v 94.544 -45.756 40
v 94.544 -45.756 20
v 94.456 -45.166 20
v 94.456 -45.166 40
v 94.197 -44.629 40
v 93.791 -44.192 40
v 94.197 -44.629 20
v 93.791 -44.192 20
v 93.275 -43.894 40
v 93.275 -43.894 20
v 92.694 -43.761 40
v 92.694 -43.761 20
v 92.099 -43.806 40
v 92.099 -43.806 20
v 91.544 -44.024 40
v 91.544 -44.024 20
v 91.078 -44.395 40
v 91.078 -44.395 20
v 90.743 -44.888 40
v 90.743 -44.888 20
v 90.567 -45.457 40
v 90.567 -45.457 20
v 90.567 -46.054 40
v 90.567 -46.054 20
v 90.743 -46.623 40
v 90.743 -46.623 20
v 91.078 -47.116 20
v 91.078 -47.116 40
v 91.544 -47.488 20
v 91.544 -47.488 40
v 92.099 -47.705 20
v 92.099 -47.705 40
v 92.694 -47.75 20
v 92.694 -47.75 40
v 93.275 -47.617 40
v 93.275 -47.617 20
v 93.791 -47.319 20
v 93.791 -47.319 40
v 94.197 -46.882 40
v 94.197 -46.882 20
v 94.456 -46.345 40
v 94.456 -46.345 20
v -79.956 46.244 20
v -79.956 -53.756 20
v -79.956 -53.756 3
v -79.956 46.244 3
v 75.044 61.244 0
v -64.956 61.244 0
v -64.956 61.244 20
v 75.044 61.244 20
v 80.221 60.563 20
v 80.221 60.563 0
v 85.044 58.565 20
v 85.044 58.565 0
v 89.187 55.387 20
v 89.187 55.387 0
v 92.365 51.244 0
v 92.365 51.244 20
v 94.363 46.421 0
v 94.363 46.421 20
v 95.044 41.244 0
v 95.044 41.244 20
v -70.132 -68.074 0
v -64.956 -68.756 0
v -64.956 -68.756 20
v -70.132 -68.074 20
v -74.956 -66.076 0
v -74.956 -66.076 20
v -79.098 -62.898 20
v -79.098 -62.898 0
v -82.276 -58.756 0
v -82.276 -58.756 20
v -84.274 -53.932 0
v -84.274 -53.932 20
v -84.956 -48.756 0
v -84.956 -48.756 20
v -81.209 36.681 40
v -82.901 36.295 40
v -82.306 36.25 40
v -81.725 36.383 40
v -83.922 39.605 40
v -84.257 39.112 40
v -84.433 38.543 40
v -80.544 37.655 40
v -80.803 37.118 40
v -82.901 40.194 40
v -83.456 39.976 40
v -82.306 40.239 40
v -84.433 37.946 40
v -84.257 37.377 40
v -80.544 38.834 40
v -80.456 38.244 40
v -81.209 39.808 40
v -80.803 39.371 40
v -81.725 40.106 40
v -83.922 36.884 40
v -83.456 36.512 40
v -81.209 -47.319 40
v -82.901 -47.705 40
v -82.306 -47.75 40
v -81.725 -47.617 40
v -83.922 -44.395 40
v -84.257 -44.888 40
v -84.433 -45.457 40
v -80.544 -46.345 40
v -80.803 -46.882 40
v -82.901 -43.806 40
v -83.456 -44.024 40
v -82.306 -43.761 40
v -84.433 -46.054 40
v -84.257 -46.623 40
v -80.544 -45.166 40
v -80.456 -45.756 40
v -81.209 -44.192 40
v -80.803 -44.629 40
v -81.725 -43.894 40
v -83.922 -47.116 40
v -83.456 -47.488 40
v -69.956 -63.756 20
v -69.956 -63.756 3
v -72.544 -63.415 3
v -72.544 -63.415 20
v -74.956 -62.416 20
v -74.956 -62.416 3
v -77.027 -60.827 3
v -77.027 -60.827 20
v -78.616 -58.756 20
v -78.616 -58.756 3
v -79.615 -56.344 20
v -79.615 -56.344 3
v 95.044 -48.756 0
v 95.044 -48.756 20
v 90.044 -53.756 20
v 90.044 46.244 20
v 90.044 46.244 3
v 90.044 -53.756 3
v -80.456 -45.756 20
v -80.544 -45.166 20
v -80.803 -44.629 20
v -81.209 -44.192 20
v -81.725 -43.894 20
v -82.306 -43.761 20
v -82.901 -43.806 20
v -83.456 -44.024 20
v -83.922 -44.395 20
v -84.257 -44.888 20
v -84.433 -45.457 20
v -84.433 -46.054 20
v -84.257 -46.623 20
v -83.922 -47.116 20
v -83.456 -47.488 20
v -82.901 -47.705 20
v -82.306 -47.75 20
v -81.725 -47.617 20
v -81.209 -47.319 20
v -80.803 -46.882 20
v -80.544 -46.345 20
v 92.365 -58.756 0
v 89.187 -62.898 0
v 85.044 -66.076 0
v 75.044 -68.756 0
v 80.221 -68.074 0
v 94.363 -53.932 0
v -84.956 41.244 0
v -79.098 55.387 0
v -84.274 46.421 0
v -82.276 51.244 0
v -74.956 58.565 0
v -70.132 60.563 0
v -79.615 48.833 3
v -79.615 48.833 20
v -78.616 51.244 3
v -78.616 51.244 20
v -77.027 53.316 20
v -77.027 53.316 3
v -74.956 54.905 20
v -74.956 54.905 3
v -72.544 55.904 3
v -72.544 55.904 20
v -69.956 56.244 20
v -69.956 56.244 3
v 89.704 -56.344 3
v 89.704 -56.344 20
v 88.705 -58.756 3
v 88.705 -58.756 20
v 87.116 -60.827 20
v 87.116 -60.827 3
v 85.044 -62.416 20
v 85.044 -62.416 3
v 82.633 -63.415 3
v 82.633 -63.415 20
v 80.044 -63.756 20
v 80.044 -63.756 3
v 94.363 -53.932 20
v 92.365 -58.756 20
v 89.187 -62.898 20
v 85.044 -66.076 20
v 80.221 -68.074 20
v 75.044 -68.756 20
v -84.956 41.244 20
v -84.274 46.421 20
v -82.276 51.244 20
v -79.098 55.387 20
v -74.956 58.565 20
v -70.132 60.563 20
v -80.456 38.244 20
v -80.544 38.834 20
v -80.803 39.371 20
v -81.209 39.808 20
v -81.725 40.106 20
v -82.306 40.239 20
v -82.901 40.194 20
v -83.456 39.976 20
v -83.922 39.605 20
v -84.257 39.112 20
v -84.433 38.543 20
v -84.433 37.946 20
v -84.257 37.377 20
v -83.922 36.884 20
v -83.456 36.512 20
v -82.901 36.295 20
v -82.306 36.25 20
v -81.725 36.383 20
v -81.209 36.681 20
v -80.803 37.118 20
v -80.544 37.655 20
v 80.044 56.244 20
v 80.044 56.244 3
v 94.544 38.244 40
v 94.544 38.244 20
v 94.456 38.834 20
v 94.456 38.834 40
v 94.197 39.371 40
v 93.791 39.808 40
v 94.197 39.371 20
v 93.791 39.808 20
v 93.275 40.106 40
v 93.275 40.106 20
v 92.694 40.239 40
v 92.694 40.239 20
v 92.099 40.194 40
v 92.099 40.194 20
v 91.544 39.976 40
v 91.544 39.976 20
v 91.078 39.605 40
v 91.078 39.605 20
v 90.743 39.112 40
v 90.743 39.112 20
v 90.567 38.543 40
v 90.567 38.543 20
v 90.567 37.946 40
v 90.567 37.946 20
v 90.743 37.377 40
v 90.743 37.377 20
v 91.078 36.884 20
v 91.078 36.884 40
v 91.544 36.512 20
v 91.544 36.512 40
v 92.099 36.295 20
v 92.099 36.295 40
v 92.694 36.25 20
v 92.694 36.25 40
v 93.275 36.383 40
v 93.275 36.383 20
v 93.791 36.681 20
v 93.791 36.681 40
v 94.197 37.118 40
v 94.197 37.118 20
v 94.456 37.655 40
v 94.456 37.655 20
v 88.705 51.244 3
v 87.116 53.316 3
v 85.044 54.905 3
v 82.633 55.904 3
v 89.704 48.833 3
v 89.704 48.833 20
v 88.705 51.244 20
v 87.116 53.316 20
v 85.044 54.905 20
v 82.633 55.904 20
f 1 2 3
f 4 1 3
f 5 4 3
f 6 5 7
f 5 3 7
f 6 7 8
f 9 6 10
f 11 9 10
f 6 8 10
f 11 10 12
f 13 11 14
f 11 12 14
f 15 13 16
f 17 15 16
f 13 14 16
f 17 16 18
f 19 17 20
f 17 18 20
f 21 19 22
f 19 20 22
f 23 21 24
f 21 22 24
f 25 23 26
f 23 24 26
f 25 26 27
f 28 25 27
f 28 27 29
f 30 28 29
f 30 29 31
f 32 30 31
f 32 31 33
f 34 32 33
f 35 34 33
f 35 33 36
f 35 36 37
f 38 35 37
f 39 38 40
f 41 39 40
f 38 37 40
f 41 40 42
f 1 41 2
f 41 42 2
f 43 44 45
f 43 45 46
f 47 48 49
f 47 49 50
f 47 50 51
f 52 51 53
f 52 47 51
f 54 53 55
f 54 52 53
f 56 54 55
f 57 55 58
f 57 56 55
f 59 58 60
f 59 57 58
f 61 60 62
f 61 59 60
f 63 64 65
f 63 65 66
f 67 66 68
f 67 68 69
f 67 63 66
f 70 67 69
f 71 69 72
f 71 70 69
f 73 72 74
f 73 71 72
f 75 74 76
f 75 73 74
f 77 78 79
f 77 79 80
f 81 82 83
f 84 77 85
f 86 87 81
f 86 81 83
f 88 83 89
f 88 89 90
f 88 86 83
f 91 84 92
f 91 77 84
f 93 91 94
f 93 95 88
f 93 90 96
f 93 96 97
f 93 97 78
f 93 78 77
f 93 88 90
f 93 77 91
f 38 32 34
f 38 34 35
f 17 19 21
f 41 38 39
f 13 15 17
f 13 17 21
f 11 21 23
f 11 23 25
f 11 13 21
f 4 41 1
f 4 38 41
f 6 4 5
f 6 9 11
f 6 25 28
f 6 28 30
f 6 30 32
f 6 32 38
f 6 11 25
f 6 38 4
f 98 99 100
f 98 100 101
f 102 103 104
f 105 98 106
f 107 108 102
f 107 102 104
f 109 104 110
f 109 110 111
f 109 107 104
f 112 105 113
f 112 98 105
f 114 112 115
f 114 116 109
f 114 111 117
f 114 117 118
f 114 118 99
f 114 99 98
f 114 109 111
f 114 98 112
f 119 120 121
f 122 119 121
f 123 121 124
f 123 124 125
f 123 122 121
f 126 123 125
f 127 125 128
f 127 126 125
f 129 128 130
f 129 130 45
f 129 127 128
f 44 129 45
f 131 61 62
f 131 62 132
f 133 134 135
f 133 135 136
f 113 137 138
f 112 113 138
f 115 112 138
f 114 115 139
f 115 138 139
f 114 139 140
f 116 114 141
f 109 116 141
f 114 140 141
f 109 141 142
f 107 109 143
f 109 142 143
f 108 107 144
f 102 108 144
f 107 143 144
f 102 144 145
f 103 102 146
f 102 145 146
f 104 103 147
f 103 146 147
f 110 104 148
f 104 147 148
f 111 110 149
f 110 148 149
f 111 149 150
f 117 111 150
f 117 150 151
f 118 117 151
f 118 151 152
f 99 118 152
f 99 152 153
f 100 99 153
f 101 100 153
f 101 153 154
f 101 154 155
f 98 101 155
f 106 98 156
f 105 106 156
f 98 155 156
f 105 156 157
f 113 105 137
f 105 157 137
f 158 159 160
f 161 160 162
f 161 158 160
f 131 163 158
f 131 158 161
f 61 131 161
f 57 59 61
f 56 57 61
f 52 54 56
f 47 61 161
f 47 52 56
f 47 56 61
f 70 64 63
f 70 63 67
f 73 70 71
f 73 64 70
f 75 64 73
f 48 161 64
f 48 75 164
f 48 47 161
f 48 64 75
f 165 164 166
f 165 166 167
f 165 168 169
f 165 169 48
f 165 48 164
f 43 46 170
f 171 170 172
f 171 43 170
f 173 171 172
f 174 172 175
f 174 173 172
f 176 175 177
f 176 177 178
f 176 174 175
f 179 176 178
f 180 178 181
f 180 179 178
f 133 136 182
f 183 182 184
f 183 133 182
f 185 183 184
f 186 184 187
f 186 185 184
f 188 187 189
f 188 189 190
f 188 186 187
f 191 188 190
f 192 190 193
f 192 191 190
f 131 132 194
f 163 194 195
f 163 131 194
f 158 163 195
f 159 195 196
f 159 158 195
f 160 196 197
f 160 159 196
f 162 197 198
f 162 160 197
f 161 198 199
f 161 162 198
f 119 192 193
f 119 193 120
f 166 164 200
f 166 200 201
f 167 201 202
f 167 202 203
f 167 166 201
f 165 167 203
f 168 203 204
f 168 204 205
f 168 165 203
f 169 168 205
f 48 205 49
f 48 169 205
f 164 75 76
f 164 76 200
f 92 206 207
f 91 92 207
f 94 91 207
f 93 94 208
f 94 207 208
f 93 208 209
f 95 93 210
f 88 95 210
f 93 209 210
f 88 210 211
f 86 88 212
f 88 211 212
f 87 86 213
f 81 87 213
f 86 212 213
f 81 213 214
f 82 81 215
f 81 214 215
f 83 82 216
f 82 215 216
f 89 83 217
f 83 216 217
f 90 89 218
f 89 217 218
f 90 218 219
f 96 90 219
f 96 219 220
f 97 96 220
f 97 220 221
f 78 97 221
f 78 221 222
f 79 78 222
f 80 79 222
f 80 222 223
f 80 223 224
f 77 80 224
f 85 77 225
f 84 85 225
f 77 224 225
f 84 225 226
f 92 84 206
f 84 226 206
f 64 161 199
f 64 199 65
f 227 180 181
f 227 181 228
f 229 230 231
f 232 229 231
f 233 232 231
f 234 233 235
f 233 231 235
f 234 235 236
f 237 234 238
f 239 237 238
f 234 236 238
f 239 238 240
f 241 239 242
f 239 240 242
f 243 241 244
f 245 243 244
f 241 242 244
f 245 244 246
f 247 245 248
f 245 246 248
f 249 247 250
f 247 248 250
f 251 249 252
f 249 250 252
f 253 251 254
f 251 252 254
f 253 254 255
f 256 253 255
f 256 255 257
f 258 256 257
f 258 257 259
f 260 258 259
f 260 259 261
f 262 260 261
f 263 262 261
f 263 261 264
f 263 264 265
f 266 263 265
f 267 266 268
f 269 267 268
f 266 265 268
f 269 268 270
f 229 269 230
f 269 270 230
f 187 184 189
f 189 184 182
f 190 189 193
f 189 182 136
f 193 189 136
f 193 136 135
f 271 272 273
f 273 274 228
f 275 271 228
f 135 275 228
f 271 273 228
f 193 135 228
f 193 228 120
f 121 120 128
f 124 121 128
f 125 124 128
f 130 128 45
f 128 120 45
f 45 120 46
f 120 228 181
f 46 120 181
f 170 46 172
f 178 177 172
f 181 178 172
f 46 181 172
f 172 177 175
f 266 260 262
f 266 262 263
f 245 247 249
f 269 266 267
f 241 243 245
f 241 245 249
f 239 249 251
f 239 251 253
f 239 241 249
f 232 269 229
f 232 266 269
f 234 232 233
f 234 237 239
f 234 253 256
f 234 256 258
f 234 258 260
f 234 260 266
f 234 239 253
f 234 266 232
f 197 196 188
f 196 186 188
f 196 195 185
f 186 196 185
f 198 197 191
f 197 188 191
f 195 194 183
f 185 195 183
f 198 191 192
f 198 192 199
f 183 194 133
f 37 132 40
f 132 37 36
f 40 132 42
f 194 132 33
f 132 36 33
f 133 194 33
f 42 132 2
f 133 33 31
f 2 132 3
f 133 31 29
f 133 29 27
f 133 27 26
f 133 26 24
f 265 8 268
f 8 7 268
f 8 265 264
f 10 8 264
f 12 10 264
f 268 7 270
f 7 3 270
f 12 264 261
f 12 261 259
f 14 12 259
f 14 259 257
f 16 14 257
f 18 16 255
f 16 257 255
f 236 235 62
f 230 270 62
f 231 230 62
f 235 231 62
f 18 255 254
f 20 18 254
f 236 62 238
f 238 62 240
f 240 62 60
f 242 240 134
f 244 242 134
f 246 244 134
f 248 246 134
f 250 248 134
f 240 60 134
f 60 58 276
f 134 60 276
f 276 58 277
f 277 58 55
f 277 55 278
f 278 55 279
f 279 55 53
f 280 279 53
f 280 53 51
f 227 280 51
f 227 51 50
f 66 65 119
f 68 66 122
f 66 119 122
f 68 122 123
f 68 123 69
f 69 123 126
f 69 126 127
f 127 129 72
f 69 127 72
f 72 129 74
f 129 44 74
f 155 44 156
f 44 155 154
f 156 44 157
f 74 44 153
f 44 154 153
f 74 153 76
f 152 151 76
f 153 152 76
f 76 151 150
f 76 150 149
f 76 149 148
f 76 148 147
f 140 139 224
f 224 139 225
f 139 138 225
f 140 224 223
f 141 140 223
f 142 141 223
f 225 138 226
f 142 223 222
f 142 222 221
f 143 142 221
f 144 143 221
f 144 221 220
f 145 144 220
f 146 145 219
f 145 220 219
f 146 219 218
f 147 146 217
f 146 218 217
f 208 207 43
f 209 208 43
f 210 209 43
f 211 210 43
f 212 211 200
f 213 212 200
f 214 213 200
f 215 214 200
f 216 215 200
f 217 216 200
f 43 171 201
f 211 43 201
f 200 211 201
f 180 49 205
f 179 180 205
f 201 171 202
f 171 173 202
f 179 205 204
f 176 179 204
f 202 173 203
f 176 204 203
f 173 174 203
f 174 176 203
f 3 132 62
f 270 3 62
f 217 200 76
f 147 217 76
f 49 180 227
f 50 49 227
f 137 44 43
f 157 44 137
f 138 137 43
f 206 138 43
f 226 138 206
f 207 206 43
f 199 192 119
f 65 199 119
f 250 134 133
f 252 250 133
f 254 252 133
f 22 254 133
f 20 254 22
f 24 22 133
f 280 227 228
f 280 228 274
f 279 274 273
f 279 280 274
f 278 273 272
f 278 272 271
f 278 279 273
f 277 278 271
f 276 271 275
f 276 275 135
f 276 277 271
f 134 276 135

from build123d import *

# Parameters (mm, degrees)
BOSS_EXTRUDE1_DEPTH = 20
CUT_EXTRUDE1_DEPTH  = 17
SKETCH3_R           = 2
BOSS_EXTRUDE3_DEPTH = 20


with BuildPart() as part:
    # Sketch1 → Boss-Extrude1 (new body)
    with BuildSketch(Plane.XY):
        with BuildLine():
            Line((-64.955555556, 61.244444444), (75.044444444, 61.244444444))
            ThreePointArc((75.044444444, 61.244444444), (89.186580068, 55.386580068), (95.044444444, 41.244444444))
            Line((95.044444444, 41.244444444), (95.044444444, -48.755555556))
            ThreePointArc((95.044444444, -48.755555556), (89.186580068, -62.897691179), (75.044444444, -68.755555556))
            Line((75.044444444, -68.755555556), (-64.955555556, -68.755555556))
            ThreePointArc((-64.955555556, -68.755555556), (-79.097691179, -62.897691179), (-84.955555556, -48.755555556))
            Line((-84.955555556, -48.755555556), (-84.955555556, 41.244444444))
            ThreePointArc((-84.955555556, 41.244444444), (-79.097691179, 55.386580068), (-64.955555556, 61.244444444))
        make_face()
    extrude(amount=BOSS_EXTRUDE1_DEPTH)

    # Sketch2 → Cut-Extrude1 (cut)
    with BuildSketch(Plane.XY.offset(20)):
        with BuildLine():
            Line((-69.955555556, 56.244444444), (80.044444444, 56.244444444))
            ThreePointArc((80.044444444, 56.244444444), (87.115512256, 53.315512256), (90.044444444, 46.244444444))
            Line((90.044444444, 46.244444444), (90.044444444, -53.755555556))
            ThreePointArc((90.044444444, -53.755555556), (87.115512256, -60.826623367), (80.044444444, -63.755555556))
            Line((80.044444444, -63.755555556), (-69.955555556, -63.755555556))
            ThreePointArc((-69.955555556, -63.755555556), (-77.026623367, -60.826623367), (-79.955555556, -53.755555556))
            Line((-79.955555556, -53.755555556), (-79.955555556, 46.244444444))
            ThreePointArc((-79.955555556, 46.244444444), (-77.026623367, 53.315512256), (-69.955555556, 56.244444444))
        make_face()
    extrude(amount=-CUT_EXTRUDE1_DEPTH, mode=Mode.SUBTRACT)

    # Sketch3 → Boss-Extrude3 (add)
    with BuildSketch(Plane.XY.offset(20)):
        with Locations((-82.455555556, 38.244444444)):
            Circle(SKETCH3_R)
        with Locations((-82.455555556, -45.755555556)):
            Circle(SKETCH3_R)
        with Locations((92.544444444, -45.755555556)):
            Circle(SKETCH3_R)
        with Locations((92.544444444, 38.244444444)):
            Circle(SKETCH3_R)
    extrude(amount=BOSS_EXTRUDE3_DEPTH)


solid = part.part
